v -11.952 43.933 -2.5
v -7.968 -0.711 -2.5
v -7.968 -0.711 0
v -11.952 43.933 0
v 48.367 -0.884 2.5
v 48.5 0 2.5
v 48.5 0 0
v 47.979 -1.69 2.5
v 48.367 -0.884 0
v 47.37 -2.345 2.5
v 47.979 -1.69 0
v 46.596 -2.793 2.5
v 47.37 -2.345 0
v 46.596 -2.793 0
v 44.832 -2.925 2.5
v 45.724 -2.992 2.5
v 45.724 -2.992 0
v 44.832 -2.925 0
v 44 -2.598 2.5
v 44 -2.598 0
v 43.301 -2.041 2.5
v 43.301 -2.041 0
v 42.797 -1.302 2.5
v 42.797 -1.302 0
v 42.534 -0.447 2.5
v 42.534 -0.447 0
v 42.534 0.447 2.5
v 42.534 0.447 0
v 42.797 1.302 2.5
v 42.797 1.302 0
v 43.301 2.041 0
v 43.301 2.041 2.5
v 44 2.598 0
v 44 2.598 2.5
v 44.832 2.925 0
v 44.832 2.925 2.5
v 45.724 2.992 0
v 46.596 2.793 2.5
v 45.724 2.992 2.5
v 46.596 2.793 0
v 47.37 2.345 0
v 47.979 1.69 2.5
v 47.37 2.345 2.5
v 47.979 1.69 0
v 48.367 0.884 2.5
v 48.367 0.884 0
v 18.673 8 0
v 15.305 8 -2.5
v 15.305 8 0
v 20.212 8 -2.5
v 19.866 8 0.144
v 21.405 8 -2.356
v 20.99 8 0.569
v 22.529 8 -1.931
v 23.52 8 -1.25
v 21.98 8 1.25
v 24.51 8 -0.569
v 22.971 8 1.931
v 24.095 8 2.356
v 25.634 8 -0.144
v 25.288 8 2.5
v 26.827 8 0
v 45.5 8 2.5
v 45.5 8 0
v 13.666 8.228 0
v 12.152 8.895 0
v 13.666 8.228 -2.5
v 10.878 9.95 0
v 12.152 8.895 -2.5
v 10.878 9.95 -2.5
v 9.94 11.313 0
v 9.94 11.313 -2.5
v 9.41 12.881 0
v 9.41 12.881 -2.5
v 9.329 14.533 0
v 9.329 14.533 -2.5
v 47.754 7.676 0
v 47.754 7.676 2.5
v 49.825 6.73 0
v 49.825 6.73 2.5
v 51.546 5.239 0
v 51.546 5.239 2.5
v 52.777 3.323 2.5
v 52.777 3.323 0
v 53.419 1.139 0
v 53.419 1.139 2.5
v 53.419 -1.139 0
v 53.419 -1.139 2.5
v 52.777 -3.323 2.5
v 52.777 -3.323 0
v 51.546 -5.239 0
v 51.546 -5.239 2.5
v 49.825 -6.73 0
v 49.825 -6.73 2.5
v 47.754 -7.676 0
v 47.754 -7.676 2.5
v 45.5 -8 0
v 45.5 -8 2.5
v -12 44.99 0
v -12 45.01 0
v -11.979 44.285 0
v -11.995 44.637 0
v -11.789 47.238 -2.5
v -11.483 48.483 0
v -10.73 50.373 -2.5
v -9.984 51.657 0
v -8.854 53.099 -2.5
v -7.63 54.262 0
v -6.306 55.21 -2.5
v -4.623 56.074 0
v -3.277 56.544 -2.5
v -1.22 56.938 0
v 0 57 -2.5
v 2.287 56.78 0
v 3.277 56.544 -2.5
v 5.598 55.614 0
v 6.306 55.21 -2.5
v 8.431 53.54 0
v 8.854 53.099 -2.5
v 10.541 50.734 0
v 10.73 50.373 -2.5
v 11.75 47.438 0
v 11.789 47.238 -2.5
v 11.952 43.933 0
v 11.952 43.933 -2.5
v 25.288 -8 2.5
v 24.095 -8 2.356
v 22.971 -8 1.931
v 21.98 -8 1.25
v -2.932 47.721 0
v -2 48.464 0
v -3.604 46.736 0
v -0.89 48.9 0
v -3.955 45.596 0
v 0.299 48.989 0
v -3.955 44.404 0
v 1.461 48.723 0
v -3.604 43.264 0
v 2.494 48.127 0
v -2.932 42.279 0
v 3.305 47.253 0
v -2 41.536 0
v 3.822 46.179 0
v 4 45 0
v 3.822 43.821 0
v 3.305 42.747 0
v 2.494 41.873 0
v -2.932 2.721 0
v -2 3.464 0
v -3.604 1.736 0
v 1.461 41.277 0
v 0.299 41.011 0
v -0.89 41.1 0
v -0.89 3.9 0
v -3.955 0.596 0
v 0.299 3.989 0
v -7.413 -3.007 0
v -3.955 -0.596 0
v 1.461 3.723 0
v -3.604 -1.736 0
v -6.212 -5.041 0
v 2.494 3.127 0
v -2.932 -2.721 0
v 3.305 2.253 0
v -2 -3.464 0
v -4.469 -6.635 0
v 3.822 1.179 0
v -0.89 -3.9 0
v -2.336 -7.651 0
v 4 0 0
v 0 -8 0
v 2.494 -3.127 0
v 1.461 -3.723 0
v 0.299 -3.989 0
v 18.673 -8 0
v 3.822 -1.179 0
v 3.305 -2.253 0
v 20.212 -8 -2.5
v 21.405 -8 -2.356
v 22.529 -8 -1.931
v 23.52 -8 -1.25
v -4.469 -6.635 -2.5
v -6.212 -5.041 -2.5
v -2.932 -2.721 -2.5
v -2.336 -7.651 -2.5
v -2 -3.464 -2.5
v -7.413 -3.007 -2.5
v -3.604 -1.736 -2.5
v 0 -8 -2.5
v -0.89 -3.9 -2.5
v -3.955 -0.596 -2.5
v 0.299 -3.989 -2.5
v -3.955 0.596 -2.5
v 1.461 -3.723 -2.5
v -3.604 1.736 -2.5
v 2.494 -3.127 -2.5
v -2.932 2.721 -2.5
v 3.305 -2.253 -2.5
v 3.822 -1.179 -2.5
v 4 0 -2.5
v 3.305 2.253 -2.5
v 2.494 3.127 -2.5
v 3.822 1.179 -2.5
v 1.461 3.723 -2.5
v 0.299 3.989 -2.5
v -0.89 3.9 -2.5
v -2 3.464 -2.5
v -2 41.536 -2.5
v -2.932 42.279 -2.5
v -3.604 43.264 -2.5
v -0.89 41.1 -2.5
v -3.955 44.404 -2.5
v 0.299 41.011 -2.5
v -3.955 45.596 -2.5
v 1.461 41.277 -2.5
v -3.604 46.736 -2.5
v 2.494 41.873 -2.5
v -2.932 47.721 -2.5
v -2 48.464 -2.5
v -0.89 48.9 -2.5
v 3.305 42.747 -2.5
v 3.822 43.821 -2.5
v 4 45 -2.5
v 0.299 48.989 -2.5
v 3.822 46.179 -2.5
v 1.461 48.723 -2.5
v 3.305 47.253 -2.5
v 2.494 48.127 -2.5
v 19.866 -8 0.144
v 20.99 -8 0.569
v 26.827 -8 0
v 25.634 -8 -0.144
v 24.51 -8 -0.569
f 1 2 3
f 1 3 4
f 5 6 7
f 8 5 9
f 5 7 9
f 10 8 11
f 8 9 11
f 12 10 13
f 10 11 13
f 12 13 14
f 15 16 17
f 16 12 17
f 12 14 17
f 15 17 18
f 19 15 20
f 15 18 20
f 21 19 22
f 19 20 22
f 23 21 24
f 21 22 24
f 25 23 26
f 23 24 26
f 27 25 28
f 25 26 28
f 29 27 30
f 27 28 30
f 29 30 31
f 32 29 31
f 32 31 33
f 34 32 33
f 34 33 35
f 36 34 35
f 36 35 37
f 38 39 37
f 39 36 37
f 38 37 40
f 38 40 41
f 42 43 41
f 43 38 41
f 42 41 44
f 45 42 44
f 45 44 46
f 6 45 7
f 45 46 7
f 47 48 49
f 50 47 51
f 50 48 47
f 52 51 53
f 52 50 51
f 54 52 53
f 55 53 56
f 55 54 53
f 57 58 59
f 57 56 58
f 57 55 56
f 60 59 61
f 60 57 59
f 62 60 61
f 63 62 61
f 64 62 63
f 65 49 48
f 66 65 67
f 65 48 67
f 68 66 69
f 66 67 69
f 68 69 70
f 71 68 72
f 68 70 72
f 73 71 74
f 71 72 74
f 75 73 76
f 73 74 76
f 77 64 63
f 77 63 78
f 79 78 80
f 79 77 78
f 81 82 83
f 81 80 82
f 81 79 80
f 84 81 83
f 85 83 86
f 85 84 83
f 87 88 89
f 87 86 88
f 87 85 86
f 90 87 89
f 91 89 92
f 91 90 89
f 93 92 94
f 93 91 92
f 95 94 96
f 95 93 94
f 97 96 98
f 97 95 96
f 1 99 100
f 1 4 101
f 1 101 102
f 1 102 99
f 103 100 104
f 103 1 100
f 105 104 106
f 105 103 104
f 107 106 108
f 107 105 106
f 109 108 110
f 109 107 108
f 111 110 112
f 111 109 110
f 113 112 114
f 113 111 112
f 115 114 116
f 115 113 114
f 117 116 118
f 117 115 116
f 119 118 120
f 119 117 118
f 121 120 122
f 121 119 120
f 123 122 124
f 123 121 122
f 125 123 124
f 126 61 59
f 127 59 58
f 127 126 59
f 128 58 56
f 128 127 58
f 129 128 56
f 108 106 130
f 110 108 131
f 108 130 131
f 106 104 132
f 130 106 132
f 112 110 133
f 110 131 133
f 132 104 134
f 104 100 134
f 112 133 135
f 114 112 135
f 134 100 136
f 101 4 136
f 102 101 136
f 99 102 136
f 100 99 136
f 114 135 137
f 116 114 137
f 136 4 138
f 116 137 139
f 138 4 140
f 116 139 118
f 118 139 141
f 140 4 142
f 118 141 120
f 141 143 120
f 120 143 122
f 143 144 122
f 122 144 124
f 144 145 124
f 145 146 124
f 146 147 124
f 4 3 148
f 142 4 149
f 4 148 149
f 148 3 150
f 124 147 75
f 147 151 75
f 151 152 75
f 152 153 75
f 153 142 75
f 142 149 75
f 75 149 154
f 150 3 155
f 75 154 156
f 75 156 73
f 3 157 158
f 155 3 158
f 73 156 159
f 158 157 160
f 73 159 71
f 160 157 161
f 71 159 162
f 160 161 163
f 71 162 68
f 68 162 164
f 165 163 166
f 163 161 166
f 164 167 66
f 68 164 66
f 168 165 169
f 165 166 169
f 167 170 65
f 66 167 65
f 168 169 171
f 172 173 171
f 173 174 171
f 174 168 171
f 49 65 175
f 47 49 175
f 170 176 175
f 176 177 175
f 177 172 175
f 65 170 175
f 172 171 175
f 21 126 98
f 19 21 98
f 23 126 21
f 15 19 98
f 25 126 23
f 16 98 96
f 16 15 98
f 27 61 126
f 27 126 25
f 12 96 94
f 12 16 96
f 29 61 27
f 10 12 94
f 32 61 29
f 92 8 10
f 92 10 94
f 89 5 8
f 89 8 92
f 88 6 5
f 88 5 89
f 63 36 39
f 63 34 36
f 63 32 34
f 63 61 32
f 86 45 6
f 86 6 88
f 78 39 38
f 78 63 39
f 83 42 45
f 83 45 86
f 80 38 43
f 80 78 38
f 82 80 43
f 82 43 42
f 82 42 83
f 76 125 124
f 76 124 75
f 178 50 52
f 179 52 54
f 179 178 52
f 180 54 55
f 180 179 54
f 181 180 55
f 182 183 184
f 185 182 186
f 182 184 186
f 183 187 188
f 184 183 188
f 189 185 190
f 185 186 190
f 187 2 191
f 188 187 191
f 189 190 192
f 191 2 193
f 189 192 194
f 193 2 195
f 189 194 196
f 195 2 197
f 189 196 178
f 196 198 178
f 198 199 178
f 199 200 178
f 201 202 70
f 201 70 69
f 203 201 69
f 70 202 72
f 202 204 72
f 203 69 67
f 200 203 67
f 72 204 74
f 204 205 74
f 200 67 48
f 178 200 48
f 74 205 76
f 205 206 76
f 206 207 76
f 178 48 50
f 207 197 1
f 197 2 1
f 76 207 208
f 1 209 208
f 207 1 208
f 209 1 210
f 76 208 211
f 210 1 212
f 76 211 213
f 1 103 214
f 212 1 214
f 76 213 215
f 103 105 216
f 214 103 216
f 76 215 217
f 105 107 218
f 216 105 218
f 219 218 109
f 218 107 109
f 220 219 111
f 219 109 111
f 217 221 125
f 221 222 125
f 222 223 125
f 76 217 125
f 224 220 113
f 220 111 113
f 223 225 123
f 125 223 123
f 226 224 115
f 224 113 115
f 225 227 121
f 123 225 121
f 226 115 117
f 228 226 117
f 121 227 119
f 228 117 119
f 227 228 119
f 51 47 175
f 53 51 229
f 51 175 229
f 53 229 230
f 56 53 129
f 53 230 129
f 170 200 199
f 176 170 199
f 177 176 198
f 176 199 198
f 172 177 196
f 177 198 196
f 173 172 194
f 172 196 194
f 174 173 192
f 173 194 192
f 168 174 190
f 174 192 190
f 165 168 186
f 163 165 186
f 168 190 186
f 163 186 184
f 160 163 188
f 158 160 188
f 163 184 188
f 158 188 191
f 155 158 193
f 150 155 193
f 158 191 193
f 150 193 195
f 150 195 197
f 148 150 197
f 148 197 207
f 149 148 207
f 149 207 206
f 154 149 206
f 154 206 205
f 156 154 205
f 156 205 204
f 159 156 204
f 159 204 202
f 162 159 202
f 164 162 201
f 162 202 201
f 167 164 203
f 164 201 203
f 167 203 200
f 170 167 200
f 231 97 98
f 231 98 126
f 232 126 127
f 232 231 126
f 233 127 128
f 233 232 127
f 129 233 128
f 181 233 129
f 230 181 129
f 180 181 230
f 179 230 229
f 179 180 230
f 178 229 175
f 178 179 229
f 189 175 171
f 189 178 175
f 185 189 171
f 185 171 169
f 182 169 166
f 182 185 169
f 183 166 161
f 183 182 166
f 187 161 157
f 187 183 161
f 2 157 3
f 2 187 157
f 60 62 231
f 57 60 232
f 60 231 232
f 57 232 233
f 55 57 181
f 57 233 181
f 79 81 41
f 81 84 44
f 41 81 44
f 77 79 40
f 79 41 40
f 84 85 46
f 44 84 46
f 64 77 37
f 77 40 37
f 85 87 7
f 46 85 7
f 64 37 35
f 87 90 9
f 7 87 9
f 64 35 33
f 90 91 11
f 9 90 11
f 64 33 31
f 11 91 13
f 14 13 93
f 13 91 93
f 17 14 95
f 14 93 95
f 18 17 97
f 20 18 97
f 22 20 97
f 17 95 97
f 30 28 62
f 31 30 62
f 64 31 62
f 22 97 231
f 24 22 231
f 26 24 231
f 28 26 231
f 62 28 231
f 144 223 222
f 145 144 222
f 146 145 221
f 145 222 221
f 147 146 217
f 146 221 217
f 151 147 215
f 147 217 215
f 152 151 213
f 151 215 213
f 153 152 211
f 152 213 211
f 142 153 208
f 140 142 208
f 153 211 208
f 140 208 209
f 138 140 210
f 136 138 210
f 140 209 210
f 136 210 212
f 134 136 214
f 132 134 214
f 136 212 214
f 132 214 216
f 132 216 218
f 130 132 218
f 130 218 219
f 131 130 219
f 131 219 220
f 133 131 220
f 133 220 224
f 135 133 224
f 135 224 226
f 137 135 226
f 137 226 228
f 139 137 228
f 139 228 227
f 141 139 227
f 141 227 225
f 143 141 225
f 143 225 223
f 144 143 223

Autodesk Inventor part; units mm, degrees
ref_plane "YZ Plane" through (0, 0, 0) normal (1, 0, 0) x (0, 1, 0)
ref_plane "XZ Plane" through (0, 0, 0) normal (0, 1, 0) x (-1, 0, 0)
ref_plane "XY Plane" through (0, 0, 0) normal (0, 0, 1) x (1, 0, 0)
sketch "Sketch1" plane through (0, 0, 0) normal (0, 0, 1) x (1, 0, 0)
  circle A0 centre (0, 0) radius 4
  circle A1 centre (0, 45) radius 4
  circle A2 centre (45.5, 0) radius 3
  line L0 (-7.9683, -0.7111) -> (-11.9525, 43.9333)
  arc A3 (11.9525, 43.9333) -> (-11.9525, 43.9333) centre (0, 45) ccw
  line L1 (11.9525, 43.9333) -> (9.3288, 14.5333)
  arc A4 (9.3288, 14.5333) -> (15.305, 8) centre (15.305, 14) ccw
  line L2 (15.305, 8) -> (45.5, 8)
  line L3 (45.5, -8) -> (0, -8)
  arc A5 (-7.9683, -0.7111) -> (0, -8) centre (0, 0) ccw
  arc A6 (45.5, -8) -> (45.5, 8) centre (45.5, 0) ccw
  dimension "d0" = 8
  dimension "d1" = 6
  dimension "d2" = 45
  dimension "d3" = 45.5
  dimension "d4" = 12
  dimension "d5" = 8
  dimension "d6" = 8
  dimension "d7" = 6
extrude "Extrusion1" add sketch "Sketch1" along normal mid plane 5
sketch "Sketch3" plane through (0, -8, 2.5) normal (0, -1, 0) x (1, 0, 0)
  line L0 (45.5, -5) -> (45.5, 0) projected
  line L1 (0, 0) -> (45.5, 0) projected
  line L2 (45.5, -5) -> (0, -5) projected
  line L3 (0, -2.5) -> (18.6731, -2.5)
  arc A0 (18.6731, -2.5) -> (21.9803, -1.25) centre (18.6731, 2.5) ccw
  arc A1 (25.2875, 0) -> (21.9803, -1.25) centre (25.2875, -5) ccw
  line L4 (45.5, -2.5) -> (26.8269, -2.5)
  arc A2 (26.8269, -2.5) -> (23.5197, -3.75) centre (26.8269, -7.5) ccw
  arc A3 (20.2125, -5) -> (23.5197, -3.75) centre (20.2125, 0) ccw
  line L5 (23.5197, -3.75) -> (21.9803, -1.25) construction
  line L6 (45.5, -2.5) -> (53.5, -2.5)
  line L7 (53.5, -2.5) -> (53.5, -5)
  line L8 (45.5, 0) -> (45.5, -5) projected
  line L9 (53.5, -5) -> (45.5, -5)
  line L10 (53.5, -5) -> (53.5, 0) projected
  line L11 (12, 0) -> (-12, 0) projected
  line L12 (-12, -5) -> (12, -5) projected
  line L13 (0, -2.5) -> (-12, -2.5)
  line L14 (-12, -5) -> (-12, 0) projected
  line L15 (-12, -5) -> (-12, 0) projected
  line L16 (-12, -5) -> (-12, 0) projected
  point P0 (23.5197, -0.3229)
  point P1 (22.75, -2.5)
  point P2 (22.75, -5)
  point P3 (11.9525, 0)
  point P4 (-11.9525, 0)
  point P5 (11.9525, -5)
extrude "Extrusion2" cut sketch "Sketch3" against normal through all contours L2 A3 A2 L4 L0 | L0 L6 L7 L9 | A1 A0 L3 L13 L14 L11 L1
properties part number "Elbow" material "Steel, Mild"
